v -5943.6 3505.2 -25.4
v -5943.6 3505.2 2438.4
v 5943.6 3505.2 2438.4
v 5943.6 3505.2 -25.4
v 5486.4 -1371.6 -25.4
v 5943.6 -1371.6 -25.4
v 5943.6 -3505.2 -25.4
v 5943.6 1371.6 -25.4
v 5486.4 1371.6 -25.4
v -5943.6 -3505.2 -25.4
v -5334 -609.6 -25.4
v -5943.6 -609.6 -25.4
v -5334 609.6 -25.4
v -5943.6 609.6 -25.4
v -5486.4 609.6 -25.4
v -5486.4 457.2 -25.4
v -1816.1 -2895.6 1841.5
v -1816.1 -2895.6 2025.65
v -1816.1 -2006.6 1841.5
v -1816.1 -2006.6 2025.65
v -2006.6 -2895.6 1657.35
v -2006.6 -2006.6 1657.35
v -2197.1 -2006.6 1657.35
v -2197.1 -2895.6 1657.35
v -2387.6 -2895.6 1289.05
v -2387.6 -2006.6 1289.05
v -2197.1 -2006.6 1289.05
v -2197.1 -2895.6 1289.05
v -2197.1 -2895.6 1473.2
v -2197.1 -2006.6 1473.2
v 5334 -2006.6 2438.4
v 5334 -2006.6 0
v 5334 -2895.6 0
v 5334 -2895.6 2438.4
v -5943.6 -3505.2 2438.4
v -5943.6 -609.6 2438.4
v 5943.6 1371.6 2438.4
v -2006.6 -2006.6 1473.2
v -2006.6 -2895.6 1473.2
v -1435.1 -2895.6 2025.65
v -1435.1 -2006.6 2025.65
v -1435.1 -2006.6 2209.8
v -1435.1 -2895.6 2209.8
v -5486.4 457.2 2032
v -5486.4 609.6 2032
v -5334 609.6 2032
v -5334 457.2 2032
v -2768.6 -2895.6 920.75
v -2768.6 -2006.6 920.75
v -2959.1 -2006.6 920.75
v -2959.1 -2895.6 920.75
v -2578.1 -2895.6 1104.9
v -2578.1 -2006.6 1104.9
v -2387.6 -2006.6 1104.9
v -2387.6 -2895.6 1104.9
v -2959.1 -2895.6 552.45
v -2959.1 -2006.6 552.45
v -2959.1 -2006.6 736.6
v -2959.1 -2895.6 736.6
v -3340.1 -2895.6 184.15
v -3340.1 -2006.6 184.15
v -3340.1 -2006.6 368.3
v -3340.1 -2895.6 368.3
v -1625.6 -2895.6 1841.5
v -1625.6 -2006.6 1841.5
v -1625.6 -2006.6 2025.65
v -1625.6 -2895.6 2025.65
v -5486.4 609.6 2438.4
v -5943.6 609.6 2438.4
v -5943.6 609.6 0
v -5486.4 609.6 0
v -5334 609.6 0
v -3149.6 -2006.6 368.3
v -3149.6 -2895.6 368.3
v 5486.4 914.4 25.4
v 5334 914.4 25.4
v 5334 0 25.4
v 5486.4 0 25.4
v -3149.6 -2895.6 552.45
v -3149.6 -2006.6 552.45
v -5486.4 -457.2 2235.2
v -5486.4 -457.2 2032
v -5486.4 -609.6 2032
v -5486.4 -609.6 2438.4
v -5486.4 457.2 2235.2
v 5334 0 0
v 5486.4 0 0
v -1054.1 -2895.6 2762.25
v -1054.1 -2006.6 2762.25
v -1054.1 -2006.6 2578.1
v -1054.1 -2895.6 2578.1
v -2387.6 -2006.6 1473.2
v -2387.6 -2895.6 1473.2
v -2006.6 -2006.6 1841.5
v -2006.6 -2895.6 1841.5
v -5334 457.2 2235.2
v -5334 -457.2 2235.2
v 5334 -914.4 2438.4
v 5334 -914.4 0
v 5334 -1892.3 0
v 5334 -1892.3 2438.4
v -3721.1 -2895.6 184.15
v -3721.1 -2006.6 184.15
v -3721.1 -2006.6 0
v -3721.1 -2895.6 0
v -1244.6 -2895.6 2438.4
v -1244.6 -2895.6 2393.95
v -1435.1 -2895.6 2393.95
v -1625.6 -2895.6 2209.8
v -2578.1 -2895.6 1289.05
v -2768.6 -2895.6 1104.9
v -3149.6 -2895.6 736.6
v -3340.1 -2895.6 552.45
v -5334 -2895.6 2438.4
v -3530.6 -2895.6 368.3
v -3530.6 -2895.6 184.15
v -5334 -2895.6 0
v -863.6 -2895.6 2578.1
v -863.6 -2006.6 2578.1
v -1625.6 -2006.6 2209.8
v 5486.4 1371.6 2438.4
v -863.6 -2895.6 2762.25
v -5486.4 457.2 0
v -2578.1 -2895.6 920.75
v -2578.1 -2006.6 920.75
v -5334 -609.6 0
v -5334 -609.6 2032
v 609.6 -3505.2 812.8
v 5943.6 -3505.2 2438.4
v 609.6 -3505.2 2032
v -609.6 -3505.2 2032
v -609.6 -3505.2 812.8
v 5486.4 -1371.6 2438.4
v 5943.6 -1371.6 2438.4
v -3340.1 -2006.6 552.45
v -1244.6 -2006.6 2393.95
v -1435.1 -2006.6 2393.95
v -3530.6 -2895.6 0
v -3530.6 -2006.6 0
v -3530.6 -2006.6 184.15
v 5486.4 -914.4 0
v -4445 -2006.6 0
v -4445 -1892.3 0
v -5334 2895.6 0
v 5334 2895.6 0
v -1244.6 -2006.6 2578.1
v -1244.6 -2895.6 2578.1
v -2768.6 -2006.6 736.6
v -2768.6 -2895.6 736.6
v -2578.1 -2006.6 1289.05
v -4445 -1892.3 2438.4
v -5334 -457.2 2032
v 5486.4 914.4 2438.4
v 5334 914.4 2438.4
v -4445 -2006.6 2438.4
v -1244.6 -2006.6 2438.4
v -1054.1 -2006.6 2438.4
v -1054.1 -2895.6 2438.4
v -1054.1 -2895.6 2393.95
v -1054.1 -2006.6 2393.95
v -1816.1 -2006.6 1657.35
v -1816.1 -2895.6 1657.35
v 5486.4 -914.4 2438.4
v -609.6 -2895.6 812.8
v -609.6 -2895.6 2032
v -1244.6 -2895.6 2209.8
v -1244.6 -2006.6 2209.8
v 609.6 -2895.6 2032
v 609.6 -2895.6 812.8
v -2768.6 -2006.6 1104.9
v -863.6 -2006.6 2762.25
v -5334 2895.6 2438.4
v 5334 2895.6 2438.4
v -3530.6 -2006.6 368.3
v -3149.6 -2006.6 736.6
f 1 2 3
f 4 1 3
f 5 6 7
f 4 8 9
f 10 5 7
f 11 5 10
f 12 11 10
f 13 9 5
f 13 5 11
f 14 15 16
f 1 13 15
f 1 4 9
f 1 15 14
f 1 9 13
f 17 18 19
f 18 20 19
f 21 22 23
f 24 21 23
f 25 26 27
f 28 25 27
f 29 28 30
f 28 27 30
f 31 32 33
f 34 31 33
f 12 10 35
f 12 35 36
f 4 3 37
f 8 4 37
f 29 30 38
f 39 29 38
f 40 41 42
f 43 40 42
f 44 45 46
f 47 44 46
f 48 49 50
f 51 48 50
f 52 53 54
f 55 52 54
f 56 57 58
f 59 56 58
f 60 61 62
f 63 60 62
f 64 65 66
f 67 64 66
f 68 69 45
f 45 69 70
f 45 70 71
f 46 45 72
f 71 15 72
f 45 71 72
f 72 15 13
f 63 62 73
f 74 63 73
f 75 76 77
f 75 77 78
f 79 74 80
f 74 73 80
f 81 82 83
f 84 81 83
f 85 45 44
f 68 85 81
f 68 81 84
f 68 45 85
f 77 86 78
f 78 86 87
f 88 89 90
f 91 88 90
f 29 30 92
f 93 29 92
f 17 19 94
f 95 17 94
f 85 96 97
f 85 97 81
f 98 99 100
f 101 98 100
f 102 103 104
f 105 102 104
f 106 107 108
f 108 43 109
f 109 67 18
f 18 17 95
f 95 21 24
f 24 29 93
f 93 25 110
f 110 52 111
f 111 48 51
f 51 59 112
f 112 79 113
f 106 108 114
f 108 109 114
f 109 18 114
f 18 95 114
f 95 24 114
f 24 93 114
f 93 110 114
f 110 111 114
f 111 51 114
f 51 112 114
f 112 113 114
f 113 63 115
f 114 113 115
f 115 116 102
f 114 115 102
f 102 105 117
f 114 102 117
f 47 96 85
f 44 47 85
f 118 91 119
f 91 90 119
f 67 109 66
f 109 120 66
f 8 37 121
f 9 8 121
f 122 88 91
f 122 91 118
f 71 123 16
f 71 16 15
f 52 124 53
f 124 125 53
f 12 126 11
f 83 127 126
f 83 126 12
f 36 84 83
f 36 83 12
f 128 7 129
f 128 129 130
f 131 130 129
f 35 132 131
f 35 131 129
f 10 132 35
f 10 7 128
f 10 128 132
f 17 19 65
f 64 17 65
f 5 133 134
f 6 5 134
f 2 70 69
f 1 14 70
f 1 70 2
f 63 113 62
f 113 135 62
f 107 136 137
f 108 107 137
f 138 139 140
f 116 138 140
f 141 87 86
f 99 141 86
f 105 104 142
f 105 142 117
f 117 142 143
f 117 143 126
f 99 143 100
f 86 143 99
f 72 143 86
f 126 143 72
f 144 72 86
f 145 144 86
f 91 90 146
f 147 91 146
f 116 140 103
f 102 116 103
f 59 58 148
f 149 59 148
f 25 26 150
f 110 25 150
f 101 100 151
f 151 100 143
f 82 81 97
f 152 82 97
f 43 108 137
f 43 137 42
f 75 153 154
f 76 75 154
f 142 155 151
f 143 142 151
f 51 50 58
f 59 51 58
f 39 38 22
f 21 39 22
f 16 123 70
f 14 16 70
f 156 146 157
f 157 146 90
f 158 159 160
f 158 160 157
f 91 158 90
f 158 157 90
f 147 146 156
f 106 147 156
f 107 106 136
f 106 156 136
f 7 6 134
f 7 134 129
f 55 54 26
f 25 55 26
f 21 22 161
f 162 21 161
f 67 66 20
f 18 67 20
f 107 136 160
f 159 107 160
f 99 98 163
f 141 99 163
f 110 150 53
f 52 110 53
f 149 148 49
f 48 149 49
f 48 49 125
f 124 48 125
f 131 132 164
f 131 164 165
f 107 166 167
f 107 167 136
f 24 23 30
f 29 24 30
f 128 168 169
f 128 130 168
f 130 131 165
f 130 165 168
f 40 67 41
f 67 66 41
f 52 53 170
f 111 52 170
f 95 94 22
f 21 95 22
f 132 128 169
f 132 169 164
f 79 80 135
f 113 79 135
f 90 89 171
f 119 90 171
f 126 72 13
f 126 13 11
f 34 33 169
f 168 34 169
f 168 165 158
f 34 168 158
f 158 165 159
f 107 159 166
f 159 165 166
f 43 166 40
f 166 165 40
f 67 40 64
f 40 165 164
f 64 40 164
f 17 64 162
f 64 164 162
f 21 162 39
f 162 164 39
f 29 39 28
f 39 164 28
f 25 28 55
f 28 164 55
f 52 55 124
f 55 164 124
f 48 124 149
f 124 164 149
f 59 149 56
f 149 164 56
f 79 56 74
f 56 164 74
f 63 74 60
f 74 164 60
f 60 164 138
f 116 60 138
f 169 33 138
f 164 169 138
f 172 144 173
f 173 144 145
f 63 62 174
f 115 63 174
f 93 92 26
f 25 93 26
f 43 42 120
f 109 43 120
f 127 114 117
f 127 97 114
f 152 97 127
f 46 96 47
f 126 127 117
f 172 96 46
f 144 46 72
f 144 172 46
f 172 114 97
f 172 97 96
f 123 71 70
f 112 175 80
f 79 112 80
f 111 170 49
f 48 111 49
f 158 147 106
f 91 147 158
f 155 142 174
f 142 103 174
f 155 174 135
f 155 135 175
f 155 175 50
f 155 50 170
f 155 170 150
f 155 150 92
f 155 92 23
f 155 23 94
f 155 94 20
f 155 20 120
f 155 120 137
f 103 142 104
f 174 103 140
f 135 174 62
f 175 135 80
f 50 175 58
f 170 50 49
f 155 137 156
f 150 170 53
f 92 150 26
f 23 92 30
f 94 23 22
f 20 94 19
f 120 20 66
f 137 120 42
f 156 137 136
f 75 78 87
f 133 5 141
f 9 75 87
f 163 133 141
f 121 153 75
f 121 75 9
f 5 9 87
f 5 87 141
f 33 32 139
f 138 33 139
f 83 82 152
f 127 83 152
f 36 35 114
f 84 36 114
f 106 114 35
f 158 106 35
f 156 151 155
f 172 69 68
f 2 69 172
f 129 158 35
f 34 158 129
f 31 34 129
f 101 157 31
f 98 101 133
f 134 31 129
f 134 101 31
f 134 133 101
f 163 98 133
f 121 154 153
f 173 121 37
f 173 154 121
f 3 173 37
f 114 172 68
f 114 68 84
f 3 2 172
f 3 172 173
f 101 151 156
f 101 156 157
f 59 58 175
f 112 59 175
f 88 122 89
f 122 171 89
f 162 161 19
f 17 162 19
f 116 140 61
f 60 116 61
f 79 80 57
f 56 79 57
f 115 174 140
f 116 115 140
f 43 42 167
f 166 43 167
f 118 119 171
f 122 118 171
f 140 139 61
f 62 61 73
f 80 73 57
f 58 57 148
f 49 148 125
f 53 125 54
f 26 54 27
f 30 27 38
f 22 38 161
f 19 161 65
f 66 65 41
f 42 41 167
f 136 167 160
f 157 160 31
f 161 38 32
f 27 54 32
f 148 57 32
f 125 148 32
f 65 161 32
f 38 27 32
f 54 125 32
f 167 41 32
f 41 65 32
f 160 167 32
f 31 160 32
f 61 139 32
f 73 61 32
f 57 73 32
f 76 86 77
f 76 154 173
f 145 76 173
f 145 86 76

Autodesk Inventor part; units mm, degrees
ref_plane "YZ Plane" through (0, 0, 0) normal (1, 0, 0) x (0, 1, 0)
ref_plane "XZ Plane" through (0, 0, 0) normal (0, 1, 0) x (-1, 0, 0)
ref_plane "XY Plane" through (0, 0, 0) normal (0, 0, 1) x (1, 0, 0)
sketch "Sketch1" plane through (0, 0, 0) normal (0, 0, 1) x (1, 0, 0)
  line L0 (-8321.04, 0) -> (8321.04, 0) projected
  line L1 (-5943.6, 3505.2) -> (5943.6, 3505.2)
  line L2 (-5334, 2895.6) -> (5334, 2895.6)
  line L3 (-4572, 2895.6) -> (-4419.6, 2895.6)
  line L4 (-1981.2, -2006.6) -> (-4445, -2006.6)
  line L5 (-4445, -2006.6) -> (-4445, -1892.3)
  line L6 (-1219.2, -2895.6) -> (-1066.8, -2895.6)
  line L7 (5334, -2895.6) -> (0, -2895.6)
  line L8 (0, -2895.6) -> (-5334, -2895.6)
  line L9 (5943.6, -3505.2) -> (0, -3505.2)
  line L10 (0, -3505.2) -> (-5943.6, -3505.2)
  line L11 (5334, 914.4) -> (5943.6, 914.4)
  line L12 (5943.6, -914.4) -> (5334, -914.4)
  line L13 (5334, 2895.6) -> (5334, 914.4)
  line L14 (5334, -914.4) -> (5334, -2895.6)
  line L15 (5943.6, 3505.2) -> (5943.6, 914.4)
  line L16 (5943.6, -914.4) -> (5943.6, -3505.2)
  line L17 (-4445, -2006.6) -> (5334, -2006.6)
  line L18 (5334, -1892.3) -> (-4445, -1892.3)
  line L19 (-4445, -1892.3) -> (-4445, -2006.6)
  line L20 (5334, -1892.3) -> (5334, -2006.6)
  line L21 (-5943.6, 609.6) -> (-5334, 609.6)
  line L22 (-5334, -609.6) -> (-5943.6, -609.6)
  line L23 (-5943.6, -3505.2) -> (-5943.6, -609.6)
  line L24 (-5943.6, 609.6) -> (-5943.6, 3505.2)
  line L25 (-5334, -2895.6) -> (-5334, -609.6)
  line L26 (-5334, 609.6) -> (-5334, 2895.6)
  line L27 (-4445, -2006.6) -> (-4419.6, -2006.6)
  line L28 (-4419.6, 2895.6) -> (-4572, 2895.6)
  line L29 (-4445, -1892.3) -> (-4445, -2006.6)
  line L30 (0, -4907.28) -> (0, 4907.28) projected
  dimension "d18" = 7010.4
  dimension "d19" = 609.6
  dimension "d20" = 609.6
  dimension "d23" = 1828.8
  dimension "d24" = 2590.8
  dimension "d25" = 609.6
  dimension "d28" = 114.3
  dimension "d29" = 0
  dimension "d34" = 1219.2
  dimension "d35" = 2895.6
  dimension "d36" = 609.6
  dimension "d46" = 889
  dimension "d105" = 889
  dimension "d106" = 11887.2
extrude "Extrusion9" add sketch "Sketch1" along normal blind 2438.4 contours L18 L14 L17 L30 | L30 L17 L4 L5 L18 | L1 L30 L2 L26 L21 L24 | L1 L15 L11 L13 L2 L30 | L14 L12 L16 L9 L30 L7 | L30 L10 L23 L22 L25 L8 L6
sketch "Sketch8" plane through (0, 0, 0) normal (0, 0, -1) x (-1, 0, 0)
  line L0 (5943.6, 3505.2) -> (-5943.6, 3505.2) projected
  line L1 (-5943.6, 3505.2) -> (-5943.6, 914.4) projected
  line L2 (-5943.6, 914.4) -> (-5334, 914.4) projected
  line L3 (-5334, 914.4) -> (-5334, 2895.6) projected
  line L4 (-5334, 2895.6) -> (5334, 2895.6) projected
  line L5 (5334, 2895.6) -> (5334, 609.6) projected
  line L6 (5334, 609.6) -> (5943.6, 609.6) projected
  line L7 (5943.6, 609.6) -> (5943.6, 3505.2) projected
  line L8 (-5943.6, 3505.2) -> (5943.6, 3505.2)
  line L9 (5943.6, 3505.2) -> (5943.6, -3505.2)
  line L10 (5943.6, -3505.2) -> (-5943.6, -3505.2)
  line L11 (-5943.6, -3505.2) -> (-5943.6, 3505.2)
  point P0 (0, 0)
extrude "Extrusion10" add sketch "Sketch8" along normal blind 25.4
sketch "Sketch9" plane through (0, 0, 2438.4) normal (0, 0, 1) x (1, 0, 0)
  line L0 (5943.6, 3505.2) -> (-5943.6, 3505.2) projected
  line L1 (-5943.6, 3505.2) -> (-5943.6, 609.6) projected
  line L2 (-5943.6, 609.6) -> (-5334, 609.6) projected
  line L3 (-5334, 609.6) -> (-5334, 2895.6) projected
  line L4 (-5334, 2895.6) -> (5334, 2895.6) projected
  line L5 (5334, 2895.6) -> (5334, 914.4) projected
  line L6 (5334, 914.4) -> (5943.6, 914.4) projected
  line L7 (5943.6, 914.4) -> (5943.6, 3505.2) projected
  line L8 (-5943.6, 609.6) -> (-5334, 609.6)
  line L9 (-5334, 609.6) -> (-5334, -609.6)
  line L10 (-5334, -609.6) -> (-5943.6, -609.6)
  line L11 (-5943.6, -609.6) -> (-5943.6, 609.6)
  line L12 (5334, 914.4) -> (5943.6, 914.4)
  line L13 (5943.6, 914.4) -> (5943.6, -914.4)
  line L14 (5943.6, -914.4) -> (5334, -914.4)
  line L15 (5334, -914.4) -> (5334, 914.4)
  point P0 (0, 0)
extrude "Extrusion11" add sketch "Sketch9" against normal blind 406.4 contours L13 L14 L15 L6 | L2 L9 L10 L11
sketch "Sketch10" plane through (-4445, -2006.6, 2438.4) normal (0, -1, 0) x (1, 0, 0)
  line L0 (0, -2438.4) -> (9779, -2438.4) projected
  line L1 (0, -2438.4) -> (0, 0) projected
  line L2 (723.9, -2438.4) -> (914.4, -2438.4)
  line L3 (914.4, -2438.4) -> (914.4, -2254.25)
  line L4 (914.4, -2254.25) -> (723.9, -2254.25)
  line L5 (723.9, -2254.25) -> (723.9, -2438.4)
  line L6 (914.4, -2254.25) -> (1104.9, -2254.25)
  line L7 (1104.9, -2254.25) -> (1104.9, -2070.1)
  line L8 (1104.9, -2070.1) -> (914.4, -2070.1)
  line L9 (914.4, -2070.1) -> (914.4, -2254.25)
  line L10 (1104.9, -2070.1) -> (1295.4, -2070.1)
  line L11 (1295.4, -2070.1) -> (1295.4, -1885.95)
  line L12 (1295.4, -1885.95) -> (1104.9, -1885.95)
  line L13 (1104.9, -1885.95) -> (1104.9, -2070.1)
  line L14 (1295.4, -1885.95) -> (1485.9, -1885.95)
  line L15 (1485.9, -1885.95) -> (1485.9, -1701.8)
  line L16 (1485.9, -1701.8) -> (1295.4, -1701.8)
  line L17 (1295.4, -1701.8) -> (1295.4, -1885.95)
  line L18 (1485.9, -1701.8) -> (1676.4, -1701.8)
  line L19 (1676.4, -1701.8) -> (1676.4, -1517.65)
  line L20 (1676.4, -1517.65) -> (1485.9, -1517.65)
  line L21 (1485.9, -1517.65) -> (1485.9, -1701.8)
  line L22 (1676.4, -1517.65) -> (1866.9, -1517.65)
  line L23 (1866.9, -1517.65) -> (1866.9, -1333.5)
  line L24 (1866.9, -1333.5) -> (1676.4, -1333.5)
  line L25 (1676.4, -1333.5) -> (1676.4, -1517.65)
  line L26 (1866.9, -1333.5) -> (2057.4, -1333.5)
  line L27 (2057.4, -1333.5) -> (2057.4, -1149.35)
  line L28 (2057.4, -1149.35) -> (1866.9, -1149.35)
  line L29 (1866.9, -1149.35) -> (1866.9, -1333.5)
  line L30 (2438.4, -965.2) -> (2438.4, -781.05)
  line L31 (2247.9, -1149.35) -> (2247.9, -965.2)
  line L32 (2247.9, -965.2) -> (2438.4, -965.2)
  line L33 (2438.4, -781.05) -> (2247.9, -781.05)
  line L34 (2247.9, -781.05) -> (2247.9, -965.2)
  line L35 (2057.4, -1149.35) -> (2247.9, -1149.35)
  line L36 (2247.9, -965.2) -> (2057.4, -965.2)
  line L37 (2057.4, -965.2) -> (2057.4, -1149.35)
  line L38 (2628.9, -781.05) -> (2628.9, -596.9)
  line L39 (2438.4, -781.05) -> (2628.9, -781.05)
  line L40 (2628.9, -596.9) -> (2438.4, -596.9)
  line L41 (2438.4, -596.9) -> (2438.4, -781.05)
  line L42 (3200.4, -228.6) -> (3200.4, -44.45)
  line L43 (3200.4, 139.7) -> (3200.4, -44.45)
  line L44 (3200.4, -44.45) -> (3390.9, -44.45)
  line L45 (3390.9, 139.7) -> (3200.4, 139.7)
  line L46 (3009.9, -44.45) -> (3009.9, -228.6)
  line L47 (3009.9, -228.6) -> (3200.4, -228.6)
  line L48 (3200.4, -44.45) -> (3009.9, -44.45)
  line L49 (3390.9, -44.45) -> (3390.9, 139.7)
  line L50 (3009.9, -412.75) -> (3009.9, -228.6)
  line L51 (3009.9, -228.6) -> (2819.4, -228.6)
  line L52 (2819.4, -412.75) -> (3009.9, -412.75)
  line L53 (2819.4, -228.6) -> (2819.4, -412.75)
  line L54 (2819.4, -596.9) -> (2819.4, -412.75)
  line L55 (2819.4, -412.75) -> (2628.9, -412.75)
  line L56 (2628.9, -596.9) -> (2819.4, -596.9)
  line L57 (2628.9, -412.75) -> (2628.9, -596.9)
  line L58 (3390.9, 139.7) -> (3581.4, 139.7)
  line L59 (3581.4, 139.7) -> (3581.4, 323.85)
  line L60 (3581.4, 323.85) -> (3390.9, 323.85)
  line L61 (3390.9, 323.85) -> (3390.9, 139.7)
  point P0 (8445.5, -2438.4)
  point P1 (4445, -2438.4)
  dimension "d113" = 190.5
  dimension "d115" = 184.15
  dimension "d116" = 723.9
  dimension "d117" = 190.5
  dimension "d118" = 184.15
  dimension "d119" = 190.5
  dimension "d120" = 184.15
  dimension "d121" = 190.5
  dimension "d122" = 184.15
  dimension "d123" = 190.5
  dimension "d124" = 184.15
  dimension "d125" = 190.5
  dimension "d126" = 184.15
  dimension "d127" = 190.5
  dimension "d128" = 184.15
  dimension "d129" = 190.5
  dimension "d130" = 184.15
  dimension "d131" = 190.5
  dimension "d132" = 184.15
  dimension "d133" = 190.5
  dimension "d134" = 184.15
  dimension "d135" = 190.5
  dimension "d136" = 184.15
  dimension "d137" = 190.5
  dimension "d138" = 184.15
  dimension "d139" = 190.5
  dimension "d140" = 184.15
  dimension "d141" = 190.5
  dimension "d142" = 184.15
  dimension "d154" = 184.15
  dimension "d155" = 190.5
extrude "Extrusion12" add sketch "Sketch10" along normal up to surface (889 mm away)
sketch "Sketch11" plane through (-5943.6, -3505.2, 2438.4) normal (0, -1, 0) x (1, 0, 0)
  line L0 (5334, -406.4) -> (6553.2, -406.4)
  line L1 (6553.2, -406.4) -> (6553.2, -1625.6)
  line L2 (6553.2, -1625.6) -> (5334, -1625.6)
  line L3 (5334, -1625.6) -> (5334, -406.4)
  line L4 (11277.6, -2438.4) -> (2413, -2438.4) projected
  line L5 (5943.6, -2956.56) -> (5943.6, 492.76) projected
  point P0 (5943.6, -2438.4)
  dimension "d145" = 1219.2
  dimension "d147" = 1219.2
  dimension "d148" = 812.8
extrude "Extrusion13" cut sketch "Sketch11" against normal up to surface (609.6 mm away)
sketch "Sketch14" plane through (0, 0, 2032) normal (0, 0, -1) x (-1, 0, 0)
  line L0 (-5334, -914.4) -> (-5334, 914.4) projected
  line L1 (-5943.6, 914.4) -> (-5943.6, -914.4) projected
  line L2 (-8321.04, 0) -> (8321.04, 0) projected
  line L3 (-5943.6, 12.7) -> (-5334, 12.7)
  line L4 (-5334, 12.7) -> (-5334, -12.7)
  line L5 (-5334, -12.7) -> (-5943.6, -12.7)
  line L6 (-5943.6, -12.7) -> (-5943.6, 12.7)
  point P0 (0, 0)
  dimension "d156" = 25.4
extrude "Extrusion15" add sketch "Sketch14" along normal blind 25.4
sketch "Sketch15" plane through (0, 0, 0) normal (0, 0, 1) x (1, 0, 0)
  line L0 (5334, -914.4) -> (5334, -1892.3) projected
  line L1 (5943.6, -914.4) -> (5334, -914.4) projected
  line L2 (5943.6, 914.4) -> (5334, 914.4) projected
  line L3 (5334, 914.4) -> (5334, 2895.6) projected
  line L4 (-5334, 2895.6) -> (-5334, 609.6) projected
  line L5 (-5334, -609.6) -> (-5943.6, -609.6) projected
  line L6 (-3721.1, -2895.6) -> (-5334, -2895.6) projected
  line L7 (-8321.04, 0) -> (8321.04, 0) projected
  circle A0 centre (-1778, 0) radius 152.4
  circle A1 centre (1778, 0) radius 152.4
  line L8 (-4445, -2006.6) -> (-5334, -2006.6)
  line L9 (-5334, -2006.6) -> (-5334, -2895.6)
  line L10 (-5334, -2895.6) -> (-4445, -2895.6)
  line L11 (-4445, -2895.6) -> (-4445, -2006.6)
  circle A2 centre (-4889.5, -2451.1) radius 152.4
  circle A3 centre (-5334, 0) radius 152.4
  line L12 (-5118.1, -215.9) -> (-5549.9, -215.9)
  line L13 (-5549.9, -215.9) -> (-5549.9, 215.9)
  line L14 (-5549.9, 215.9) -> (-5118.1, -215.9)
  circle A4 centre (5334, 457.2) radius 152.4
  line L15 (5549.9, 241.3) -> (5118.1, 241.3)
  line L16 (5118.1, 241.3) -> (5118.1, 673.1)
  line L17 (5118.1, 673.1) -> (5549.9, 241.3)
  circle A5 centre (5334, -457.2) radius 152.4
  line L18 (5549.9, -673.1) -> (5118.1, -673.1)
  line L19 (5118.1, -241.3) -> (5549.9, -673.1)
  line L20 (5118.1, -673.1) -> (5118.1, -241.3)
  line L21 (-4713.5236, -2146.3) -> (-4537.5473, -2451.1)
  line L22 (-4537.5473, -2451.1) -> (-4713.5236, -2755.9)
  line L23 (-4713.5236, -2755.9) -> (-5065.4764, -2755.9)
  line L24 (-5065.4764, -2755.9) -> (-5241.4527, -2451.1)
  line L25 (-5241.4527, -2451.1) -> (-5065.4764, -2146.3)
  line L26 (-5065.4764, -2146.3) -> (-4713.5236, -2146.3)
  line L27 (-5943.6, -3505.2) -> (-5943.6, 3505.2) projected
  line L28 (-5334, -609.6) -> (-5943.6, -609.6)
  line L29 (-5943.6, -609.6) -> (-5943.6, 609.6)
  line L30 (-5943.6, 609.6) -> (-5334, 609.6)
  line L31 (-5334, 609.6) -> (-5334, -609.6)
  line L32 (-5486.4, 609.6) -> (-5334, 609.6)
  line L33 (-5334, 609.6) -> (-5334, 457.2)
  line L34 (-5334, 457.2) -> (-5486.4, 457.2)
  line L35 (-5486.4, 457.2) -> (-5486.4, 609.6)
  line L36 (-5334, -609.6) -> (-5486.4, -609.6)
  line L37 (-5486.4, -609.6) -> (-5486.4, -457.2)
  line L38 (-5486.4, -457.2) -> (-5334, -457.2)
  line L39 (-5334, -457.2) -> (-5334, -609.6)
  line L40 (5943.6, 3505.2) -> (5943.6, -3505.2) projected
  line L41 (5486.4, 914.4) -> (5943.6, 914.4)
  line L42 (5943.6, 914.4) -> (5943.6, 1371.6)
  line L43 (5943.6, 1371.6) -> (5486.4, 1371.6)
  line L44 (5486.4, 1371.6) -> (5486.4, 914.4)
  line L45 (5943.6, -914.4) -> (5486.4, -914.4)
  line L46 (5486.4, -914.4) -> (5486.4, -1371.6)
  line L47 (5486.4, -1371.6) -> (5943.6, -1371.6)
  line L48 (5943.6, -1371.6) -> (5943.6, -914.4)
  line L49 (5486.4, 914.4) -> (6132.9784, 1560.9784)
  line L50 (6132.9784, 1560.9784) -> (6240.7415, 1453.2154)
  line L51 (6240.7415, 1453.2154) -> (5594.1631, 806.6369)
  line L52 (5486.4, 914.4) -> (5594.1631, 806.6369)
  line L53 (5486.4, -914.4) -> (6132.9784, -1560.9784)
  line L54 (6132.9784, -1560.9784) -> (6240.7415, -1453.2154)
  line L55 (6240.7415, -1453.2154) -> (5594.1631, -806.6369)
  line L56 (5486.4, -914.4) -> (5594.1631, -806.6369)
  line L57 (5486.4, 1371.6) -> (5943.6, 1371.6)
  line L58 (5943.6, 1371.6) -> (5943.6, -1371.6)
  line L59 (5943.6, -1371.6) -> (5486.4, -1371.6)
  line L60 (5486.4, -1371.6) -> (5486.4, 1371.6)
  line L61 (-5486.4, 457.2) -> (-6353.876, 746.3587)
  line L62 (-6353.876, 746.3587) -> (-6402.0691, 601.7793)
  line L63 (-6402.0691, 601.7793) -> (-5534.5931, 312.6207)
  line L64 (-5486.4, 457.2) -> (-5534.5931, 312.6207)
  line L65 (5334, 914.4) -> (5486.4, 914.4)
  line L66 (5486.4, 914.4) -> (5486.4, 0)
  line L67 (5486.4, 0) -> (5334, 0)
  line L68 (5334, 0) -> (5334, 914.4)
  point P0 (0, 0)
  point P1 (1.5875, 1.5875)
  point P2 (770.0638, -2405.9824)
  point P3 (-4729.4618, 0)
  point P4 (5334, 457.2)
  point P5 (5334, -457.2)
  dimension "d161" = 304.8
  dimension "d163" = 304.8
  dimension "d164" = 3556
  dimension "d165" = 7112
  dimension "d166" = 304.8
  dimension "d167" = 444.5
  dimension "d168" = 444.5
  dimension "d169" = 304.8
  dimension "d172" = 431.8
  dimension "d173" = 431.8
  dimension "d174" = 215.9
  dimension "d175" = 304.8
  dimension "d176" = 431.8
  dimension "d177" = 431.8
  dimension "d178" = 215.9
  dimension "d179" = 304.8
  dimension "d180" = 431.8
  dimension "d181" = 431.8
  dimension "d182" = 215.9
  dimension "d183" = 457.2
  dimension "d184" = 457.2
  dimension "d185" = 609.6
  dimension "d192" = 152.4
  dimension "d193" = 152.4
  dimension "d194" = 152.4
  dimension "d195" = 457.2
  dimension "d196" = 457.2
  dimension "d197" = 457.2
  dimension "d198" = 457.2
  dimension "d199" = 914.4
  dimension "d200" = 152.4
  dimension "d215" = 152.4
  dimension "d216" = 914.4
extrude "Extrusion18" add sketch "Sketch15" along normal blind 25.4 contours L60 L19 L18 | L18 L20 L19 A5 L60 | L60 L17 L15 | L15 L68 A4 L17 L60 | L15 L16 L17 A4 L68 | L19 A5 | L68 L17 A4 | A4 L17 L68 picked at (5279.404, -461.4477) picked at (5392.7005, 374.4694) picked at (5251.2694, 515.9005)
extrude "Extrusion19" cut sketch "Sketch15" along normal up to surface (2438.4 mm away) contours L40 L55 L1 | L1 L55 L56 L60 L18 L19 L7 L40 | L55 L40 L53 L1 | L1 L56 L55 | L7 L60 L15 L17 L52 L51 L2 L40 | L53 L47 L46 | L2 L51 L40 | L60 L19 L18 | L60 L17 L15 | L51 L52 L2 | L2 L49 L40 L51 | L44 L43 L49
extrude "Extrusion20" add sketch "Sketch15" along normal blind 25.4 contours L60 L19 L18 | L18 L20 L19 A5 L60 | L60 L17 L15 | L15 L68 A4 L17 L60 | L15 L16 L17 A4 L68 | L19 A5 | L68 L17 A4 | A4 L17 L68 picked at (5279.404, -461.4477) picked at (5392.7005, 374.4694) picked at (5251.2694, 515.9005)
sketch "Sketch16" plane through (0, 0, 2438.4) normal (0, 0, 1) x (1, 0, 0)
  line L0 (5486.4, 914.4) -> (5334, 914.4) projected
  line L1 (5334, -914.4) -> (5486.4, -914.4) projected
  line L2 (5334, 914.4) -> (5486.4, 914.4)
  line L3 (5486.4, 914.4) -> (5486.4, -914.4)
  line L4 (5486.4, -914.4) -> (5334, -914.4)
  line L5 (5334, -914.4) -> (5334, 914.4)
  point P0 (0, 0)
extrude "Extrusion22" cut sketch "Sketch16" against normal up to surface (431.8 mm away)
sketch "Sketch17" plane through (0, 0, 2438.4) normal (0, 0, 1) x (1, 0, 0)
  line L0 (-5334, -2895.6) -> (-5334, 2895.6) projected
  line L1 (-5943.6, 3505.2) -> (-5943.6, -3505.2) projected
  line L2 (-5334, 609.6) -> (-5334, -609.6) projected
  line L3 (-5486.4, 457.2) -> (-5486.4, 609.6) projected
  line L4 (-5334, 457.2) -> (-5486.4, 457.2) projected
  line L5 (-5334, 609.6) -> (-5943.6, 609.6) projected
  line L6 (-5486.4, -457.2) -> (-5334, -457.2) projected
  line L7 (-5486.4, -609.6) -> (-5486.4, -457.2) projected
  line L8 (-5334, -609.6) -> (-5943.6, -609.6) projected
  point P0 (0, 0)
extrude "Extrusion23" cut sketch "Sketch17" against normal up to surface (406.4 mm away) contours L6 L7 L8 L1 L5 L3 L4 L0
sketch "Sketch18" plane through (-5486.4, 457.2, 2438.4) normal (0, -1, 0) x (1, 0, 0)
  line L0 (152.4, 0) -> (152.4, -406.4) projected
  line L1 (0, 0) -> (152.4, 0)
  line L2 (152.4, 0) -> (152.4, -203.2)
  line L3 (152.4, -203.2) -> (0, -203.2)
  line L4 (0, -203.2) -> (0, 0)
  point P0 (5486.4, -2438.4)
extrude "Extrusion24" add sketch "Sketch18" along normal up to surface (914.4 mm away)
extrude "Extrusion25" cut sketch "Sketch15" along normal blind 25.4 contours L60 L19 L18 | L18 L20 L19 A5 L60 | L60 L17 L15 | L15 L68 A4 L17 L60 | L15 L16 L17 A4 L68 | L19 A5 | L68 L17 A4 | A4 L17 L68 picked at (5279.404, -461.4477) picked at (5392.7005, 374.4694) picked at (5251.2694, 515.9005)
extrude "Extrusion28" add sketch "Sketch15" along normal blind 25.4 contours L7 L68 L15 L60 | L15 L68 A4 L17 L60 | L17 A4 L60 | L60 A4 L68 L2 | L68 L17 A4 | L17 L68 A4 picked at (5392.7005, 374.4694) picked at (5372.8195, 550.9185)
extrude "Extrusion29" cut sketch "Sketch15" against normal blind 25.4 contours L40 L55 L1 | L1 L55 L56 L60 L18 L19 L7 L40 | L55 L40 L53 L1 | L1 L56 L55 | L7 L60 L15 L17 L52 L51 L2 L40 | L53 L47 L46 | L2 L51 L40 | L60 L19 L18 | L60 L17 L15 | L51 L52 L2 | L2 L49 L40 L51 | L44 L43 L49
extrude "Extrusion30" cut sketch "Sketch15" against normal blind 25.4 contours L31 A3 L7 | L7 A3 L14 | L14 A3 L31 | A3 L14 L13 L7 L27 L63 L64 L34 L31 | A3 L31 L12 L13 L7 | L7 L13 L14 A3 | L34 L35 L30 L31 | L13 L12 L31 L38 L37 L5 L27 L7 | L64 L63 L27 L61 | L31 L5 L37 L38 picked at (-5362.0822, -97.4756) picked at (-5435.2806, 5.6878) picked at (-5383.0685, 88.7828)
sketch "Sketch12" plane through (0, 0, 2438.4) normal (0, 0, 1) x (1, 0, 0)
  line L0 (-5943.6, -3505.2) -> (5943.6, -3505.2) projected
  line L1 (5943.6, -3505.2) -> (5943.6, 3505.2) projected
  line L2 (5943.6, 3505.2) -> (-5943.6, 3505.2) projected
  line L3 (-5943.6, 3505.2) -> (5943.6, 3505.2)
  line L4 (5943.6, 3505.2) -> (5943.6, -2463.8)
  line L5 (5943.6, -2463.8) -> (-5943.6, -2463.8)
  line L6 (-5943.6, -2463.8) -> (-5943.6, 3505.2)
  line L7 (-1054.1, -2006.6) -> (5943.6, -2006.6)
  line L8 (5943.6, -2006.6) -> (5943.6, -3505.2)
  line L9 (5943.6, -3505.2) -> (-1054.1, -3505.2)
  line L10 (-1054.1, -3505.2) -> (-1054.1, -2006.6)
  line L11 (-5943.6, -2463.8) -> (-5181.6, -2463.8)
  line L12 (-5181.6, -2463.8) -> (-5181.6, -3505.2)
  line L13 (-5181.6, -3505.2) -> (-5943.6, -3505.2)
  line L14 (-5943.6, -3505.2) -> (-5943.6, -2463.8)
  line L15 (-1054.1, -2895.6) -> (-5943.6, -2895.6)
  line L16 (-5943.6, -2895.6) -> (-5943.6, -3505.2)
  line L17 (-5943.6, -3505.2) -> (-1054.1, -3505.2)
  line L18 (-1054.1, -3505.2) -> (-1054.1, -2895.6)
  point P0 (0, 0)
properties part number "West_Structure_Hose_Test_General_1st_Floor"
